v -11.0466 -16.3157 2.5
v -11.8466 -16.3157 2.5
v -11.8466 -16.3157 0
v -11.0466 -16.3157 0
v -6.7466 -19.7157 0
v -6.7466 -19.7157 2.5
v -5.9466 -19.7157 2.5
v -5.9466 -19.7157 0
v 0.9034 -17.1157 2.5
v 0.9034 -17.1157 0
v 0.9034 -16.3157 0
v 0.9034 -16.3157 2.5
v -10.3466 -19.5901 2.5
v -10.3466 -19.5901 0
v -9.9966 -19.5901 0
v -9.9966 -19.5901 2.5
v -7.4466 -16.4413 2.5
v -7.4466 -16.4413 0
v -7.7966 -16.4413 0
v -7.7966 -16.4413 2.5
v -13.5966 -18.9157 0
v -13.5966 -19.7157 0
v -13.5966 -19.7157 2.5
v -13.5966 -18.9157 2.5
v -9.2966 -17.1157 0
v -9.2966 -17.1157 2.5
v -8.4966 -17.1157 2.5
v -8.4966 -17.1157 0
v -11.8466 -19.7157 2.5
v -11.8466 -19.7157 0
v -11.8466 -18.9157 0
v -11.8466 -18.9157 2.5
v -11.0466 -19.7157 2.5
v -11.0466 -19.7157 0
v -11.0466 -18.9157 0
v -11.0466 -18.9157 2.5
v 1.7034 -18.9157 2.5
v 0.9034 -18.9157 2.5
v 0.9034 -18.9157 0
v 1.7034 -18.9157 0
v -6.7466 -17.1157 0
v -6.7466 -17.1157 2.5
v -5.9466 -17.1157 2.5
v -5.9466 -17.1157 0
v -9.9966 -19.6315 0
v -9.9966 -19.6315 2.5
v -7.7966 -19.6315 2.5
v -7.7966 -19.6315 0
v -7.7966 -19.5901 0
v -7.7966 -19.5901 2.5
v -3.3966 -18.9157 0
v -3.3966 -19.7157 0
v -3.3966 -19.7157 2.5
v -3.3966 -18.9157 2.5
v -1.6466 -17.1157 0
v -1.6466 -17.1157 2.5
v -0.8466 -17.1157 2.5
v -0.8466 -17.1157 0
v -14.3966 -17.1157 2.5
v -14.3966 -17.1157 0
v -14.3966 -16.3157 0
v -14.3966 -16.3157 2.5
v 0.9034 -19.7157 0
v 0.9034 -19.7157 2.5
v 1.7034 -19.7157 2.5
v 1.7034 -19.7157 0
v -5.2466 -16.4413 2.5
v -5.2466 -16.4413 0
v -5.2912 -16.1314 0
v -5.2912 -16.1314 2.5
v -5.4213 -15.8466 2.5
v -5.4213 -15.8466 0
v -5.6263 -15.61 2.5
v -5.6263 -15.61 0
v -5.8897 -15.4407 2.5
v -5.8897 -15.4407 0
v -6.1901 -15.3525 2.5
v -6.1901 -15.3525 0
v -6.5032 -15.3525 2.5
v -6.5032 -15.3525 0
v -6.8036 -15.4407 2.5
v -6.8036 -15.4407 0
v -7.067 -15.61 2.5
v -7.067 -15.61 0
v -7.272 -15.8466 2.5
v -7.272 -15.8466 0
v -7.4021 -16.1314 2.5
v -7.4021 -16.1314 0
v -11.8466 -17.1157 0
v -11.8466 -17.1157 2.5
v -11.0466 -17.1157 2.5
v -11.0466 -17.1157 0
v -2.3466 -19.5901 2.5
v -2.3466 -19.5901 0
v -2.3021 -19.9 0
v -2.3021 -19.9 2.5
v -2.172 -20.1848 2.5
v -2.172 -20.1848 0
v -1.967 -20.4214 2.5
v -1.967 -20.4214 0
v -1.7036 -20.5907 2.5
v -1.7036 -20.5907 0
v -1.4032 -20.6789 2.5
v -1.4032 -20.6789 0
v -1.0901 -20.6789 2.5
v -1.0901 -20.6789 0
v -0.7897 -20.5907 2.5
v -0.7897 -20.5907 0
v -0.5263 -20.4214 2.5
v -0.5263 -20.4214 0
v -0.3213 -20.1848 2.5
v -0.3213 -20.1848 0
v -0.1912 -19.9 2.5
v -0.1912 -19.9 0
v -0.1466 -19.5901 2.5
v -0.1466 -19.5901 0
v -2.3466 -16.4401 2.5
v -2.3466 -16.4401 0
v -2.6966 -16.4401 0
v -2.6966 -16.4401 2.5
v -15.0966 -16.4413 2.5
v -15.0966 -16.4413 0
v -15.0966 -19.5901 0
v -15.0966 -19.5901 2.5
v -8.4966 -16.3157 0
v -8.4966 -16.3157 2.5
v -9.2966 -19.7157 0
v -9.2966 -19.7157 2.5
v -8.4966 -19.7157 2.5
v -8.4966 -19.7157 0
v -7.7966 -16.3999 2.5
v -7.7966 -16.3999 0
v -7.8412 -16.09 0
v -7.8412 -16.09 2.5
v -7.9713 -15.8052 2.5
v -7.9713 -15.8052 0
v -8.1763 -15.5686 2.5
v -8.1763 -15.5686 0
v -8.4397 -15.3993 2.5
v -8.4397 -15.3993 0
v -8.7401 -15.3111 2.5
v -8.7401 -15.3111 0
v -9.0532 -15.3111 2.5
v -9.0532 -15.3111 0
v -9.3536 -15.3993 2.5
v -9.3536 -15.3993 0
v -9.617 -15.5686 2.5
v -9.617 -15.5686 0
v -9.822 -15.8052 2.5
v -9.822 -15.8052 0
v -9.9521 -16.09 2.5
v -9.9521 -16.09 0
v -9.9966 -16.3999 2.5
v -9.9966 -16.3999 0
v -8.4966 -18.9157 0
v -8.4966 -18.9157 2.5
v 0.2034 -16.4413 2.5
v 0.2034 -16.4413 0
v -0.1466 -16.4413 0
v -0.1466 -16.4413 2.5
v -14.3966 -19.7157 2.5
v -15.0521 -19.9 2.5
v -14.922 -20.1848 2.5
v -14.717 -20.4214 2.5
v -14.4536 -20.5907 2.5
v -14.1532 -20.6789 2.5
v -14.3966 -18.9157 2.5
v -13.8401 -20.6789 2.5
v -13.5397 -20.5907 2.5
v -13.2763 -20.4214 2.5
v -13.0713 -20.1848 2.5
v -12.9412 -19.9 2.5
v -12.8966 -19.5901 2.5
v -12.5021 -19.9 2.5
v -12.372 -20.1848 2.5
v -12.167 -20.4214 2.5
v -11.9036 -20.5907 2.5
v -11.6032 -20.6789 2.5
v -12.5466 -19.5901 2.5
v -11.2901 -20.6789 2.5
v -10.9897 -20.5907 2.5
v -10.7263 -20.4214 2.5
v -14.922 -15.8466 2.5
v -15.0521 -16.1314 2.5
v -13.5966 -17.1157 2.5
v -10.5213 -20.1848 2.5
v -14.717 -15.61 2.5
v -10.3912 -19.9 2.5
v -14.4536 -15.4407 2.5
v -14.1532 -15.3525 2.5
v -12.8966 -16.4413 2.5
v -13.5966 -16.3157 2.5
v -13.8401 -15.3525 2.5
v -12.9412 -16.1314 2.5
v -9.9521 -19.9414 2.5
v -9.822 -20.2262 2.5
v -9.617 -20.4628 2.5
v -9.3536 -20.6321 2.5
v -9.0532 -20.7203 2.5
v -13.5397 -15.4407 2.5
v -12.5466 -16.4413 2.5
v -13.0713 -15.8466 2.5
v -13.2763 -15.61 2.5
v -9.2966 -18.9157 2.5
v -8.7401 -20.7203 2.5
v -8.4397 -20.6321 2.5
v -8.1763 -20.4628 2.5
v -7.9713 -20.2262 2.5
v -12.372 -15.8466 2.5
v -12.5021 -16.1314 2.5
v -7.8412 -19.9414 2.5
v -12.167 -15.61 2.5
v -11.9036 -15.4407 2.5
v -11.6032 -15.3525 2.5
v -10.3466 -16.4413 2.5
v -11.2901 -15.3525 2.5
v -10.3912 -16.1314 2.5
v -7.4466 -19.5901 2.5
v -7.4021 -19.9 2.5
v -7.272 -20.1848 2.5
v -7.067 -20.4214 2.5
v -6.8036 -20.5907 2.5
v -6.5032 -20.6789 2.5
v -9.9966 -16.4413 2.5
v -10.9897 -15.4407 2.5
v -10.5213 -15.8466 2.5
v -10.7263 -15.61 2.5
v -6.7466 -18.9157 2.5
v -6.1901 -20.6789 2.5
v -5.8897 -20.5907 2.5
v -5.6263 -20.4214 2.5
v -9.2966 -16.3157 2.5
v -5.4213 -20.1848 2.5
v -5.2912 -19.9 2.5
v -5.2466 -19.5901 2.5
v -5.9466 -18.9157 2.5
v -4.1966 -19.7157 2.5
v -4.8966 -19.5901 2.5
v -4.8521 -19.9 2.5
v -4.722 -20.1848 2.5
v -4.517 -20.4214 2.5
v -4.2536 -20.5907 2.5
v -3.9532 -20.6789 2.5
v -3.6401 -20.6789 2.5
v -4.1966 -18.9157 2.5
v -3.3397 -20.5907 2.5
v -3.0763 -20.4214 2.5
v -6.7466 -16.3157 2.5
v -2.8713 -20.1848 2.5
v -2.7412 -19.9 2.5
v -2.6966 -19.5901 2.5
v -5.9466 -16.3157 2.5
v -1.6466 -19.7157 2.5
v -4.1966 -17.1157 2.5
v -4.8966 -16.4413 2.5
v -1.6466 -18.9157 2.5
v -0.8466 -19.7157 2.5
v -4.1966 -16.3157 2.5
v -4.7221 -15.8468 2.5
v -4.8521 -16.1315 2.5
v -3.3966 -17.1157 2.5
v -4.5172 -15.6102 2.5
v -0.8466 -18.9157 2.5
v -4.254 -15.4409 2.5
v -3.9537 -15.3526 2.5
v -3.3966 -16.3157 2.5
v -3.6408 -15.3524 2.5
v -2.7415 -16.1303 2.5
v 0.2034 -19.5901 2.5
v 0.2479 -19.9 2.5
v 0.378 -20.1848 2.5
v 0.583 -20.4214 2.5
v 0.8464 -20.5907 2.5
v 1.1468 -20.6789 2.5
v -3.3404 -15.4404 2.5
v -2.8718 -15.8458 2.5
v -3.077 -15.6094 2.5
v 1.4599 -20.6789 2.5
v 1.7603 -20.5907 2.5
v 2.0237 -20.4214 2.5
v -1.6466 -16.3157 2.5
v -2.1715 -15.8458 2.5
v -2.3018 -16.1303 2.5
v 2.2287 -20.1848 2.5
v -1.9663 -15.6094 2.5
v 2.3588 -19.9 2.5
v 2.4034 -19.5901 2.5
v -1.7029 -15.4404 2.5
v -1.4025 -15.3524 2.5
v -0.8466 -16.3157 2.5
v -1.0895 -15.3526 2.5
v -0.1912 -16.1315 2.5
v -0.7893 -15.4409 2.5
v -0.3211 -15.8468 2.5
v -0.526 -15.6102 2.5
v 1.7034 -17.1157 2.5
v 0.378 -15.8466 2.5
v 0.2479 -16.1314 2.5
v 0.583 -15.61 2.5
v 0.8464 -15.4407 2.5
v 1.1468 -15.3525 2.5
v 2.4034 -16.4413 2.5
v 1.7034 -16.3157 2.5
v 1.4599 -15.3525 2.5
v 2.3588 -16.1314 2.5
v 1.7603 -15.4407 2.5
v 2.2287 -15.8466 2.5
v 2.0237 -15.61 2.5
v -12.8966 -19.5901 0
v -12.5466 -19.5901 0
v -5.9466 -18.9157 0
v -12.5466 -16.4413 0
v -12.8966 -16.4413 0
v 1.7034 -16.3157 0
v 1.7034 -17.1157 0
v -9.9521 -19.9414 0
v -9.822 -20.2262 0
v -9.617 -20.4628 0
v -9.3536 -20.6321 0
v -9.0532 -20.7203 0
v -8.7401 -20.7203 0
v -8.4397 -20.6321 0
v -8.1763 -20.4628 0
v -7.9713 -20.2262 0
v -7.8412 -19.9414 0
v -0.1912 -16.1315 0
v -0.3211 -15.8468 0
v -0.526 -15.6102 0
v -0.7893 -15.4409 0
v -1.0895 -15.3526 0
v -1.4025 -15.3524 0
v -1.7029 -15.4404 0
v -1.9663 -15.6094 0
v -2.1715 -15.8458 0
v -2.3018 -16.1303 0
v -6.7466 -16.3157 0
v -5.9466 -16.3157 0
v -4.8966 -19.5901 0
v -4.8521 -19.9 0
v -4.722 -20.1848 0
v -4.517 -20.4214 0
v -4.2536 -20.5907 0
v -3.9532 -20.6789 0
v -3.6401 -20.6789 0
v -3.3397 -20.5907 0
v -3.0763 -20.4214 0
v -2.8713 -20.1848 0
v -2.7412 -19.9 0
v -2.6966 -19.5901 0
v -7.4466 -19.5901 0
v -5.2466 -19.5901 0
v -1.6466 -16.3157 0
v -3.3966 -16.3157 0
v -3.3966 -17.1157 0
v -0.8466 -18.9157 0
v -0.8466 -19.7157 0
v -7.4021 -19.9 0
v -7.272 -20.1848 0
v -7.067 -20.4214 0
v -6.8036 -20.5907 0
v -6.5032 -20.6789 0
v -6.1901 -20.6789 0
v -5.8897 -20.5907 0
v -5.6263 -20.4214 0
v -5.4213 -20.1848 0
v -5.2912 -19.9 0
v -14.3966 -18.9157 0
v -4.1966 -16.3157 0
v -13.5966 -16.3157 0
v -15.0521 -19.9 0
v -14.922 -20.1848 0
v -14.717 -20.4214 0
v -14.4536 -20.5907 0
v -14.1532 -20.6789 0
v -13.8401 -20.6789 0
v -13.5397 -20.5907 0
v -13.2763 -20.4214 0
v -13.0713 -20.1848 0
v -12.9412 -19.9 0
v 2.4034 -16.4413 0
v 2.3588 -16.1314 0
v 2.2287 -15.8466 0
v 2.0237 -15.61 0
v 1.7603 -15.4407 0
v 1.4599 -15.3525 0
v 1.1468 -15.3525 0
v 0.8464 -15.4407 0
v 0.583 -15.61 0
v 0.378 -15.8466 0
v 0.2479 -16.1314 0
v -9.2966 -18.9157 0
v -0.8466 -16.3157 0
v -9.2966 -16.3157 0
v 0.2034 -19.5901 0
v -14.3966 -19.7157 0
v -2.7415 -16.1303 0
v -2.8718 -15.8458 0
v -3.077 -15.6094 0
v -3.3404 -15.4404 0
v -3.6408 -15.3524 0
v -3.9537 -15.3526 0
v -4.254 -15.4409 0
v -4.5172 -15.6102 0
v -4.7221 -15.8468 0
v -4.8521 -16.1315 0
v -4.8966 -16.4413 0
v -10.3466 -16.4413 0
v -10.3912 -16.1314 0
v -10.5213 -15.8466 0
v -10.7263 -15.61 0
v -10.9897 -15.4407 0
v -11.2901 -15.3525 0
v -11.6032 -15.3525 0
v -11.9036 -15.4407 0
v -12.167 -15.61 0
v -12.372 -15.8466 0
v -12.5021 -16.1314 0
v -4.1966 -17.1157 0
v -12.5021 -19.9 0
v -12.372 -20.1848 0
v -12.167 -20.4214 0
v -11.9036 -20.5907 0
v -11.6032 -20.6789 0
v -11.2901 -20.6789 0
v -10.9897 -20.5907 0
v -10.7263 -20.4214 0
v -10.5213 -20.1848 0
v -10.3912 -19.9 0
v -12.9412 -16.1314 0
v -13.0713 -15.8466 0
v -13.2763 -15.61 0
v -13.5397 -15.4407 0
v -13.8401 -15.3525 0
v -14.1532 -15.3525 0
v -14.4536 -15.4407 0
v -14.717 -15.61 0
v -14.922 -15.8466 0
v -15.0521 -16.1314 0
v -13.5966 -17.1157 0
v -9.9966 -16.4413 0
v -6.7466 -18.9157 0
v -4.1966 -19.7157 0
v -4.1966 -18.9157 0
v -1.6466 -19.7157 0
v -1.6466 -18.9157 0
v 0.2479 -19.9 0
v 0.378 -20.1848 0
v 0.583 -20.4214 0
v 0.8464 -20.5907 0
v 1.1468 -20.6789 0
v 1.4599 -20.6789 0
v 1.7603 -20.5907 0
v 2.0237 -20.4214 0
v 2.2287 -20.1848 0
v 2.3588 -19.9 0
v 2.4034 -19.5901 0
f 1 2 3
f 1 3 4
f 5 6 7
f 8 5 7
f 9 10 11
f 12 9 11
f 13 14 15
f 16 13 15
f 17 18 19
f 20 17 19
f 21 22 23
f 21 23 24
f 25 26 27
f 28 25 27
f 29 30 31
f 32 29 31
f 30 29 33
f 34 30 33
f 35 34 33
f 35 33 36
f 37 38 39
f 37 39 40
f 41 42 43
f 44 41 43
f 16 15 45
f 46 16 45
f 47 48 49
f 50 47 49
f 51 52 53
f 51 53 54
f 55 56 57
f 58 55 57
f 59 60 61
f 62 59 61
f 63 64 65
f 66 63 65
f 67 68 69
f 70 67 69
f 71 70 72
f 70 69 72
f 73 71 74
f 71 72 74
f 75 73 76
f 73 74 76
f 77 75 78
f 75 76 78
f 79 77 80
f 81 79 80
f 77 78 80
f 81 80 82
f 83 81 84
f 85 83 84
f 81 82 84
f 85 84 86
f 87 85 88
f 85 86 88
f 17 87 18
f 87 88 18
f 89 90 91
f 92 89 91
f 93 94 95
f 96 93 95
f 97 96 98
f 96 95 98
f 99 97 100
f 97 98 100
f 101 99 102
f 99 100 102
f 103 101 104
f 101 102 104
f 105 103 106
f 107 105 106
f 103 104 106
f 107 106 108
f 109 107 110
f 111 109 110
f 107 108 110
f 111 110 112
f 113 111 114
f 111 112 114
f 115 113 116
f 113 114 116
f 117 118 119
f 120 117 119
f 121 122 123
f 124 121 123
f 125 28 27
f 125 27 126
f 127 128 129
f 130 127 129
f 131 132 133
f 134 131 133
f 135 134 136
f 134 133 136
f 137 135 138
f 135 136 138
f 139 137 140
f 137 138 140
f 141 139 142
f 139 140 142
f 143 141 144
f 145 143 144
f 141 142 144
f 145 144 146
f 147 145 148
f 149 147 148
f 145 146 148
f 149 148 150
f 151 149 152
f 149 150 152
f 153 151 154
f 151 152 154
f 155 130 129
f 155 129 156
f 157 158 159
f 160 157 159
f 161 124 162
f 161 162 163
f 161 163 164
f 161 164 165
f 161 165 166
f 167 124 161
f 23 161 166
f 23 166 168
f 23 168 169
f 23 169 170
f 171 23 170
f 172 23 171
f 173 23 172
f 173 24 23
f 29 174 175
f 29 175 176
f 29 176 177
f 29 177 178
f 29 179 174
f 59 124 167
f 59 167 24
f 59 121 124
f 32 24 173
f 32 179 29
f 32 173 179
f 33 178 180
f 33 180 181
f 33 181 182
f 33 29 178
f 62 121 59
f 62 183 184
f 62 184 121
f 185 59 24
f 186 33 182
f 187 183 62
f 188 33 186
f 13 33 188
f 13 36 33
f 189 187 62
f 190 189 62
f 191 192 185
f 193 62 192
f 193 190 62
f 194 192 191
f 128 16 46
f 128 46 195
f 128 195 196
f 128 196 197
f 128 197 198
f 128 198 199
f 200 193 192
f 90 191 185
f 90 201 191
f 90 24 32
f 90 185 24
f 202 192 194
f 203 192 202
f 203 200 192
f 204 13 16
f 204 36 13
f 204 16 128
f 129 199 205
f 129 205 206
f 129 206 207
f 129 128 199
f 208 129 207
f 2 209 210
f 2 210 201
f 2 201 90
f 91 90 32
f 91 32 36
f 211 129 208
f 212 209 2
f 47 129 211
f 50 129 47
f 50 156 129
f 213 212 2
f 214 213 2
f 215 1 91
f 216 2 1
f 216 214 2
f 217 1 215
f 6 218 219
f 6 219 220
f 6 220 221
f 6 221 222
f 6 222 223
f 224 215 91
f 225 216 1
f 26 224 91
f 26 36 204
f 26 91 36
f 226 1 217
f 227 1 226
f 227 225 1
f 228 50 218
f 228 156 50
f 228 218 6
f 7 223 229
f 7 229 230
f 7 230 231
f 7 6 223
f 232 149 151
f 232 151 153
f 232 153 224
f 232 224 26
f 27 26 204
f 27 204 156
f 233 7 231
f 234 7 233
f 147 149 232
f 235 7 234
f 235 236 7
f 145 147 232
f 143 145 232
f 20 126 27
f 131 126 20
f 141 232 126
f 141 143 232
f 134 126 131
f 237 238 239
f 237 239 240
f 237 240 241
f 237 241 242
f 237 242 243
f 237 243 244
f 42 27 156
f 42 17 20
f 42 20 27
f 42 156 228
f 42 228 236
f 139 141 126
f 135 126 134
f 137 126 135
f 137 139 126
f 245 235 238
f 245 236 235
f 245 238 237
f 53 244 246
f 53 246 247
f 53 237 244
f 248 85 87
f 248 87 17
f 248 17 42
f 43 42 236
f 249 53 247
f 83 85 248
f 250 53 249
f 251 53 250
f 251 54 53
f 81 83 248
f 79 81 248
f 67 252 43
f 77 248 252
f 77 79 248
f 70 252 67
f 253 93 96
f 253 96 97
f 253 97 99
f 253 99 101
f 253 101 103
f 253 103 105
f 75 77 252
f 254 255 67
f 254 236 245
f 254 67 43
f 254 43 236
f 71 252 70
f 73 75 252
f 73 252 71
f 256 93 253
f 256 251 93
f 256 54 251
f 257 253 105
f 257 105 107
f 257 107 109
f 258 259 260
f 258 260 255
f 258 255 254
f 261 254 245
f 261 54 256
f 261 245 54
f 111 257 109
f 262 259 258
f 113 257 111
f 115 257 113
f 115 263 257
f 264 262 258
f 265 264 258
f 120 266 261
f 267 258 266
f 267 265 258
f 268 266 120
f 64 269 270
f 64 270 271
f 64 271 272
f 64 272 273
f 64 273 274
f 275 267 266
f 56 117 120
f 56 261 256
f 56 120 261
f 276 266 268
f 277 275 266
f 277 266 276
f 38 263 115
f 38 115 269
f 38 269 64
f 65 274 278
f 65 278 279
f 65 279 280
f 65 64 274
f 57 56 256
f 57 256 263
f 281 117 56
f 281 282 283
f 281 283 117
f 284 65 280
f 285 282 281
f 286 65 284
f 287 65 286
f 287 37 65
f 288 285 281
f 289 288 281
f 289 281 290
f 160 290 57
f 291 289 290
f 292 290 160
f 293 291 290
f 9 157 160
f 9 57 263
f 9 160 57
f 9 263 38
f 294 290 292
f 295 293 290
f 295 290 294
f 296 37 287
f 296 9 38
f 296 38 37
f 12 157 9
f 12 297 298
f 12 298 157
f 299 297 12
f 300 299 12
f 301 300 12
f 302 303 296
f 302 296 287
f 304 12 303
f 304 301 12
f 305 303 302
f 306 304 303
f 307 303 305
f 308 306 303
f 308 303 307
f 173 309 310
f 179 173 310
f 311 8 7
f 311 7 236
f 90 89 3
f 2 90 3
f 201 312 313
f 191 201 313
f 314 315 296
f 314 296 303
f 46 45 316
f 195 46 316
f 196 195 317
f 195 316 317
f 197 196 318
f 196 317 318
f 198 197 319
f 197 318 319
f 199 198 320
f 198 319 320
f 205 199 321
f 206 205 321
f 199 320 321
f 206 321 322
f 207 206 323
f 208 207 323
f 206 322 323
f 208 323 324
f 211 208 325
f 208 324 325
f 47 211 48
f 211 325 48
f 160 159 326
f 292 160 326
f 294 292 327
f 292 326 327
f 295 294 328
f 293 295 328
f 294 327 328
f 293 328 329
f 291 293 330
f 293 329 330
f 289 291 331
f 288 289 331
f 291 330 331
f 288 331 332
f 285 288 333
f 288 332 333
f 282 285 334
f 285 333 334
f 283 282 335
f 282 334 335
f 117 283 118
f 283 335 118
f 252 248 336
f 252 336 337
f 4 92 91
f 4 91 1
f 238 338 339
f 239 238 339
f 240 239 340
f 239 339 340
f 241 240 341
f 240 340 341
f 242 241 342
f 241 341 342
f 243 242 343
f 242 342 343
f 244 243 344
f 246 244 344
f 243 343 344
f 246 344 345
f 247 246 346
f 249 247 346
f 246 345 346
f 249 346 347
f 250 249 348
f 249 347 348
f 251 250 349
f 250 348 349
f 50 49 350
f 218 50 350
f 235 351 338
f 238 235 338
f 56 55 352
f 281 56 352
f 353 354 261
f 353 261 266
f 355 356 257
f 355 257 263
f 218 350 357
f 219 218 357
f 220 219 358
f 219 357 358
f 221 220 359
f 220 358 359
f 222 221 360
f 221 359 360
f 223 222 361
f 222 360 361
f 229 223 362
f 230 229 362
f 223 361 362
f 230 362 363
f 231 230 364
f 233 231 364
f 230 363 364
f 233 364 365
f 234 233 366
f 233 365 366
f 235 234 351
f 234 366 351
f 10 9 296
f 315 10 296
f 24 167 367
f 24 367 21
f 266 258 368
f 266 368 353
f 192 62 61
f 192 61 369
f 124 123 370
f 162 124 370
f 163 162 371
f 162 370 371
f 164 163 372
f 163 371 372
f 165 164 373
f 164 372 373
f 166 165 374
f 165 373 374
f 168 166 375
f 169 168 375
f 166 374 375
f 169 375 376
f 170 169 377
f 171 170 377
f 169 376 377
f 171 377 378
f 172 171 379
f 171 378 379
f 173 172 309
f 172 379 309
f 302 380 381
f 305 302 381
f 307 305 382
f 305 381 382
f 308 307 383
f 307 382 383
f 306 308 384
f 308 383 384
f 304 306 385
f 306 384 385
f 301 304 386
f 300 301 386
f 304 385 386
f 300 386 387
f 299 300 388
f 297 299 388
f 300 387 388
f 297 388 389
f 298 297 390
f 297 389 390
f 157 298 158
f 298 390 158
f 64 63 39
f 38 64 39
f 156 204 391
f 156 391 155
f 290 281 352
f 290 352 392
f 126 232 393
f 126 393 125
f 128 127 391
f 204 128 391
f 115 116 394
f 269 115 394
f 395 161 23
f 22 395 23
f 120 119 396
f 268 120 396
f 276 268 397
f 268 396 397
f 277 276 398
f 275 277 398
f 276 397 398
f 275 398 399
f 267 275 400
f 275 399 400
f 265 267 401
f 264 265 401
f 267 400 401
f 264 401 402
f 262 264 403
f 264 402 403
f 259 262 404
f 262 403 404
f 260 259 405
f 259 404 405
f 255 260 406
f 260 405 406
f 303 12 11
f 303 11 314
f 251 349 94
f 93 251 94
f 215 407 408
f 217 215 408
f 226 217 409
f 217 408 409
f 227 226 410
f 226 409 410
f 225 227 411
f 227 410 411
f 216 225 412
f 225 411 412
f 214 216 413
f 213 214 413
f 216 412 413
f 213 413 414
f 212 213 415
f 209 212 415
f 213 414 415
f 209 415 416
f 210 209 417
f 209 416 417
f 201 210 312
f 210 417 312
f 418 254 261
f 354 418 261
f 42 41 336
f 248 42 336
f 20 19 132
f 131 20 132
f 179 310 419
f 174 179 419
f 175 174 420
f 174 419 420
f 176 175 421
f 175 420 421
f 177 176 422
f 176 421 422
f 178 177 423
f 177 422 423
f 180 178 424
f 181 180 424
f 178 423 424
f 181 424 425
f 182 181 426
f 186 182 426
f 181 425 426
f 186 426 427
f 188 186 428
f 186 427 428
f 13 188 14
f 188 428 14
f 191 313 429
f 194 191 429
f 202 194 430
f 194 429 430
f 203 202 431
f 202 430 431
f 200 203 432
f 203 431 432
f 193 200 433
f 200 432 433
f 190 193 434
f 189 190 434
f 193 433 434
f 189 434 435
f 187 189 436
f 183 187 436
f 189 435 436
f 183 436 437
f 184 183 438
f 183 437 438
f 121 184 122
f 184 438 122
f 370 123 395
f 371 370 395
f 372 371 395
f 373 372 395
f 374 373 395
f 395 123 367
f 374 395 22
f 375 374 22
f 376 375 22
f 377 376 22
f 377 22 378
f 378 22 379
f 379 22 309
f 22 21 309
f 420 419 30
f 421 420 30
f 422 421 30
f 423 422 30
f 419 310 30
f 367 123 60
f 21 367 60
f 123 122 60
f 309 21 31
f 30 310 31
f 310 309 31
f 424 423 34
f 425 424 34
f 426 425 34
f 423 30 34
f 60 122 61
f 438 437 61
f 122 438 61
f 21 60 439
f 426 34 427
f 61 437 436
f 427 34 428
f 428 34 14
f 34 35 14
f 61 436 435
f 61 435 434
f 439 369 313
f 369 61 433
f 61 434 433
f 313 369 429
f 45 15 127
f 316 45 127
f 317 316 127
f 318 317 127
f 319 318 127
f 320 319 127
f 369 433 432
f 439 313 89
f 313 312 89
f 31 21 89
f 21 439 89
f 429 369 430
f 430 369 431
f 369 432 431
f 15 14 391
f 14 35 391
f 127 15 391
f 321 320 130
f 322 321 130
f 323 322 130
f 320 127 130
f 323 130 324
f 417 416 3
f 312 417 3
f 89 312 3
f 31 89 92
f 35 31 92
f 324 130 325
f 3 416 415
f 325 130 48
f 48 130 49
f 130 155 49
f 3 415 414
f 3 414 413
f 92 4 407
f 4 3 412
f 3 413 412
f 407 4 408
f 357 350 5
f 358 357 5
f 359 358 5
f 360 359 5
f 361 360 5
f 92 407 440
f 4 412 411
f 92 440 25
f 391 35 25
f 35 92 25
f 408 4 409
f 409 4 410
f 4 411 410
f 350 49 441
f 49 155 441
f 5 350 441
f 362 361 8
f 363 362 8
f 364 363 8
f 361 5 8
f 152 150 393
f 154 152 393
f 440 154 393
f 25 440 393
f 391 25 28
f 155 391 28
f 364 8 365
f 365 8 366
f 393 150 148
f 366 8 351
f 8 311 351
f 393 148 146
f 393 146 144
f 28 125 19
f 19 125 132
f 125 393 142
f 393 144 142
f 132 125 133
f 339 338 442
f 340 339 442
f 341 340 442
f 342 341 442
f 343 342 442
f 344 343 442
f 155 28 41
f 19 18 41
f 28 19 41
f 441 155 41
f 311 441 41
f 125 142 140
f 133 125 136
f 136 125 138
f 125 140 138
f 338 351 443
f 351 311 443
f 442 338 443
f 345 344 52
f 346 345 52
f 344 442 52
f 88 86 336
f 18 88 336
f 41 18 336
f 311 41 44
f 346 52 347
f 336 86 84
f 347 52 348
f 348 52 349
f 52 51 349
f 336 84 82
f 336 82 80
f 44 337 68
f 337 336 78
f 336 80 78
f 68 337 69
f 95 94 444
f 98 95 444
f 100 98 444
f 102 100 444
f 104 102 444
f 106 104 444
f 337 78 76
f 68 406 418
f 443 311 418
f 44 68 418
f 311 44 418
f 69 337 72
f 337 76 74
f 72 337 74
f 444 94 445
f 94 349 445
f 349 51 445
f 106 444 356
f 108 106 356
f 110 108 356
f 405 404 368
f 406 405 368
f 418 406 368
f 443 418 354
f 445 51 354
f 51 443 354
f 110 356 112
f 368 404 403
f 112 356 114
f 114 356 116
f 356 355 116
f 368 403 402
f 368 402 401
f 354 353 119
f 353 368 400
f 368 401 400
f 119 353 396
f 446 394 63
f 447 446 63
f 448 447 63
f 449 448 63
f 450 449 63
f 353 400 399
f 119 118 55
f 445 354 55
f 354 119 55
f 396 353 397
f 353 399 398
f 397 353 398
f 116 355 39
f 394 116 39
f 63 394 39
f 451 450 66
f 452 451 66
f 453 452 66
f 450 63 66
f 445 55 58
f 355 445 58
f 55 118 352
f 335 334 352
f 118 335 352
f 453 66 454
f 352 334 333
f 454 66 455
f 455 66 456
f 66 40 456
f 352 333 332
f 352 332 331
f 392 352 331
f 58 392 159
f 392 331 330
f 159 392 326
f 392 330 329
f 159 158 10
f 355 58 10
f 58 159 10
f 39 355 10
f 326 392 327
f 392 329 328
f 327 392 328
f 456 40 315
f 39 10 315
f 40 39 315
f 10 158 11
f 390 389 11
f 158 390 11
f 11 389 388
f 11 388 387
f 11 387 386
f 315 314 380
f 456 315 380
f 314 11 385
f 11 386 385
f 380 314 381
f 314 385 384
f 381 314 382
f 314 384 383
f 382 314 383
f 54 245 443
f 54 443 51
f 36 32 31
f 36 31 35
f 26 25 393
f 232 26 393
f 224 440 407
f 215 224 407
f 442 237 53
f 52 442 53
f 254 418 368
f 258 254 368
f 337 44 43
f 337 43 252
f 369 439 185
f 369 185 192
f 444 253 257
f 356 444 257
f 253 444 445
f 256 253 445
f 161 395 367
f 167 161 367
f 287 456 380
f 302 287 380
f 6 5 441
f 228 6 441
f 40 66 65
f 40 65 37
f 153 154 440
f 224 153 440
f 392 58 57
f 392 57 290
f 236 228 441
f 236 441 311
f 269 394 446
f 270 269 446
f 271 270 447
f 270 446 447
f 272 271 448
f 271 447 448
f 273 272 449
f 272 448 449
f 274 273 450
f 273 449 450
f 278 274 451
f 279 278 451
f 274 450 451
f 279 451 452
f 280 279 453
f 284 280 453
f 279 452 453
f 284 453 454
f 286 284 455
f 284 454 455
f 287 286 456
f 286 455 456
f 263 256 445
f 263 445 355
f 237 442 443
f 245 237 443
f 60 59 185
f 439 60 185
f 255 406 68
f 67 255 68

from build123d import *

# Parameters (mm, degrees)
P_IDAT_VYSUNUT_M2_DEPTH  = 2.5
SKICA3_W                 = 0.8
SKICA3_H                 = 0.8
ODEBRAT_VYSUNUT_M1_DEPTH = 2.5


# Read off the part's stored shape, not the designer's step: Přidat vysunutím2
with BuildPart() as part:
    # Přidat vysunutím2 outline → Přidat vysunutím2 (new body)
    with BuildSketch(Plane.XY):
        with BuildLine():
            Line((2.40336004, -19.590083306), (2.40336004, -16.441317707))
            ThreePointArc((2.40336004, -16.441317707), (1.30336004, -15.341317707), (0.20336004, -16.441317707))
            Line((0.20336004, -16.441317707), (-0.14663996, -16.441317707))
            ThreePointArc((-0.14663996, -16.441317707), (-1.24602276, -15.34131788), (-2.346639267, -16.440083307))
            Line((-2.346639267, -16.440083307), (-2.696640653, -16.440083307))
            ThreePointArc((-2.696640653, -16.440083307), (-3.79725716, -15.34131788), (-4.89663996, -16.441317707))
            Line((-4.89663996, -16.441317707), (-5.24663996, -16.441317707))
            ThreePointArc((-5.24663996, -16.441317707), (-6.34663996, -15.341317707), (-7.44663996, -16.441317707))
            Line((-7.44663996, -16.441317707), (-7.79663996, -16.441317707))
            Line((-7.79663996, -16.441317707), (-7.79663996, -16.399925636))
            ThreePointArc((-7.79663996, -16.399925636), (-8.89663996, -15.299925636), (-9.99663996, -16.399925636))
            Line((-9.99663996, -16.399925636), (-9.99663996, -16.441317707))
            Line((-9.99663996, -16.441317707), (-10.34663996, -16.441317707))
            ThreePointArc((-10.34663996, -16.441317707), (-11.44663996, -15.341317707), (-12.54663996, -16.441317707))
            Line((-12.54663996, -16.441317707), (-12.89663996, -16.441317707))
            ThreePointArc((-12.89663996, -16.441317707), (-13.99663996, -15.341317707), (-15.09663996, -16.441317707))
            Line((-15.09663996, -16.441317707), (-15.09663996, -19.590083306))
            ThreePointArc((-15.09663996, -19.590083306), (-13.99663996, -20.690083306), (-12.89663996, -19.590083306))
            Line((-12.89663996, -19.590083306), (-12.54663996, -19.590083306))
            ThreePointArc((-12.54663996, -19.590083306), (-11.44663996, -20.690083306), (-10.34663996, -19.590083306))
            Line((-10.34663996, -19.590083306), (-9.99663996, -19.590083306))
            Line((-9.99663996, -19.590083306), (-9.99663996, -19.631475378))
            ThreePointArc((-9.99663996, -19.631475378), (-8.89663996, -20.731475378), (-7.79663996, -19.631475378))
            Line((-7.79663996, -19.631475378), (-7.79663996, -19.590083306))
            Line((-7.79663996, -19.590083306), (-7.44663996, -19.590083306))
            ThreePointArc((-7.44663996, -19.590083306), (-6.34663996, -20.690083306), (-5.24663996, -19.590083306))
            Line((-5.24663996, -19.590083306), (-4.89663996, -19.590083306))
            ThreePointArc((-4.89663996, -19.590083306), (-3.79663996, -20.690083306), (-2.69663996, -19.590083306))
            Line((-2.69663996, -19.590083306), (-2.34663996, -19.590083306))
            ThreePointArc((-2.34663996, -19.590083306), (-1.24663996, -20.690083306), (-0.14663996, -19.590083306))
            Line((-0.14663996, -19.590083306), (0.20336004, -19.590083306))
            ThreePointArc((0.20336004, -19.590083306), (1.30336004, -20.690083306), (2.40336004, -19.590083306))
        make_face()
    extrude(amount=P_IDAT_VYSUNUT_M2_DEPTH)

    # Skica3 → Odebrat vysunutím1 (cut)
    with BuildSketch(Plane.XY.offset(2.5)):
        with Locations((-13.99663996, -16.715700507)):
            Rectangle(SKICA3_W, SKICA3_H)
        with Locations((-13.99663996, -19.315700507)):
            Rectangle(SKICA3_W, SKICA3_H)
        with Locations((-8.89663996, -16.715700507)):
            Rectangle(SKICA3_W, SKICA3_H)
        with Locations((-11.44663996, -16.715700507)):
            Rectangle(SKICA3_W, SKICA3_H)
        with Locations((-11.44663996, -19.315700507)):
            Rectangle(SKICA3_W, SKICA3_H)
        with Locations((-8.89663996, -19.315700507)):
            Rectangle(SKICA3_W, SKICA3_H)
        with Locations((-6.34663996, -16.715700507)):
            Rectangle(SKICA3_W, SKICA3_H)
        with Locations((-6.34663996, -19.315700507)):
            Rectangle(SKICA3_W, SKICA3_H)
        with Locations((-3.79663996, -16.715700507)):
            Rectangle(SKICA3_W, SKICA3_H)
        with Locations((-3.79663996, -19.315700507)):
            Rectangle(SKICA3_W, SKICA3_H)
        with Locations((-1.24663996, -16.715700507)):
            Rectangle(SKICA3_W, SKICA3_H)
        with Locations((-1.24663996, -19.315700507)):
            Rectangle(SKICA3_W, SKICA3_H)
        with Locations((1.30336004, -16.715700507)):
            Rectangle(SKICA3_W, SKICA3_H)
        with Locations((1.30336004, -19.315700507)):
            Rectangle(SKICA3_W, SKICA3_H)
    extrude(amount=-ODEBRAT_VYSUNUT_M1_DEPTH, mode=Mode.SUBTRACT)


solid = part.part
